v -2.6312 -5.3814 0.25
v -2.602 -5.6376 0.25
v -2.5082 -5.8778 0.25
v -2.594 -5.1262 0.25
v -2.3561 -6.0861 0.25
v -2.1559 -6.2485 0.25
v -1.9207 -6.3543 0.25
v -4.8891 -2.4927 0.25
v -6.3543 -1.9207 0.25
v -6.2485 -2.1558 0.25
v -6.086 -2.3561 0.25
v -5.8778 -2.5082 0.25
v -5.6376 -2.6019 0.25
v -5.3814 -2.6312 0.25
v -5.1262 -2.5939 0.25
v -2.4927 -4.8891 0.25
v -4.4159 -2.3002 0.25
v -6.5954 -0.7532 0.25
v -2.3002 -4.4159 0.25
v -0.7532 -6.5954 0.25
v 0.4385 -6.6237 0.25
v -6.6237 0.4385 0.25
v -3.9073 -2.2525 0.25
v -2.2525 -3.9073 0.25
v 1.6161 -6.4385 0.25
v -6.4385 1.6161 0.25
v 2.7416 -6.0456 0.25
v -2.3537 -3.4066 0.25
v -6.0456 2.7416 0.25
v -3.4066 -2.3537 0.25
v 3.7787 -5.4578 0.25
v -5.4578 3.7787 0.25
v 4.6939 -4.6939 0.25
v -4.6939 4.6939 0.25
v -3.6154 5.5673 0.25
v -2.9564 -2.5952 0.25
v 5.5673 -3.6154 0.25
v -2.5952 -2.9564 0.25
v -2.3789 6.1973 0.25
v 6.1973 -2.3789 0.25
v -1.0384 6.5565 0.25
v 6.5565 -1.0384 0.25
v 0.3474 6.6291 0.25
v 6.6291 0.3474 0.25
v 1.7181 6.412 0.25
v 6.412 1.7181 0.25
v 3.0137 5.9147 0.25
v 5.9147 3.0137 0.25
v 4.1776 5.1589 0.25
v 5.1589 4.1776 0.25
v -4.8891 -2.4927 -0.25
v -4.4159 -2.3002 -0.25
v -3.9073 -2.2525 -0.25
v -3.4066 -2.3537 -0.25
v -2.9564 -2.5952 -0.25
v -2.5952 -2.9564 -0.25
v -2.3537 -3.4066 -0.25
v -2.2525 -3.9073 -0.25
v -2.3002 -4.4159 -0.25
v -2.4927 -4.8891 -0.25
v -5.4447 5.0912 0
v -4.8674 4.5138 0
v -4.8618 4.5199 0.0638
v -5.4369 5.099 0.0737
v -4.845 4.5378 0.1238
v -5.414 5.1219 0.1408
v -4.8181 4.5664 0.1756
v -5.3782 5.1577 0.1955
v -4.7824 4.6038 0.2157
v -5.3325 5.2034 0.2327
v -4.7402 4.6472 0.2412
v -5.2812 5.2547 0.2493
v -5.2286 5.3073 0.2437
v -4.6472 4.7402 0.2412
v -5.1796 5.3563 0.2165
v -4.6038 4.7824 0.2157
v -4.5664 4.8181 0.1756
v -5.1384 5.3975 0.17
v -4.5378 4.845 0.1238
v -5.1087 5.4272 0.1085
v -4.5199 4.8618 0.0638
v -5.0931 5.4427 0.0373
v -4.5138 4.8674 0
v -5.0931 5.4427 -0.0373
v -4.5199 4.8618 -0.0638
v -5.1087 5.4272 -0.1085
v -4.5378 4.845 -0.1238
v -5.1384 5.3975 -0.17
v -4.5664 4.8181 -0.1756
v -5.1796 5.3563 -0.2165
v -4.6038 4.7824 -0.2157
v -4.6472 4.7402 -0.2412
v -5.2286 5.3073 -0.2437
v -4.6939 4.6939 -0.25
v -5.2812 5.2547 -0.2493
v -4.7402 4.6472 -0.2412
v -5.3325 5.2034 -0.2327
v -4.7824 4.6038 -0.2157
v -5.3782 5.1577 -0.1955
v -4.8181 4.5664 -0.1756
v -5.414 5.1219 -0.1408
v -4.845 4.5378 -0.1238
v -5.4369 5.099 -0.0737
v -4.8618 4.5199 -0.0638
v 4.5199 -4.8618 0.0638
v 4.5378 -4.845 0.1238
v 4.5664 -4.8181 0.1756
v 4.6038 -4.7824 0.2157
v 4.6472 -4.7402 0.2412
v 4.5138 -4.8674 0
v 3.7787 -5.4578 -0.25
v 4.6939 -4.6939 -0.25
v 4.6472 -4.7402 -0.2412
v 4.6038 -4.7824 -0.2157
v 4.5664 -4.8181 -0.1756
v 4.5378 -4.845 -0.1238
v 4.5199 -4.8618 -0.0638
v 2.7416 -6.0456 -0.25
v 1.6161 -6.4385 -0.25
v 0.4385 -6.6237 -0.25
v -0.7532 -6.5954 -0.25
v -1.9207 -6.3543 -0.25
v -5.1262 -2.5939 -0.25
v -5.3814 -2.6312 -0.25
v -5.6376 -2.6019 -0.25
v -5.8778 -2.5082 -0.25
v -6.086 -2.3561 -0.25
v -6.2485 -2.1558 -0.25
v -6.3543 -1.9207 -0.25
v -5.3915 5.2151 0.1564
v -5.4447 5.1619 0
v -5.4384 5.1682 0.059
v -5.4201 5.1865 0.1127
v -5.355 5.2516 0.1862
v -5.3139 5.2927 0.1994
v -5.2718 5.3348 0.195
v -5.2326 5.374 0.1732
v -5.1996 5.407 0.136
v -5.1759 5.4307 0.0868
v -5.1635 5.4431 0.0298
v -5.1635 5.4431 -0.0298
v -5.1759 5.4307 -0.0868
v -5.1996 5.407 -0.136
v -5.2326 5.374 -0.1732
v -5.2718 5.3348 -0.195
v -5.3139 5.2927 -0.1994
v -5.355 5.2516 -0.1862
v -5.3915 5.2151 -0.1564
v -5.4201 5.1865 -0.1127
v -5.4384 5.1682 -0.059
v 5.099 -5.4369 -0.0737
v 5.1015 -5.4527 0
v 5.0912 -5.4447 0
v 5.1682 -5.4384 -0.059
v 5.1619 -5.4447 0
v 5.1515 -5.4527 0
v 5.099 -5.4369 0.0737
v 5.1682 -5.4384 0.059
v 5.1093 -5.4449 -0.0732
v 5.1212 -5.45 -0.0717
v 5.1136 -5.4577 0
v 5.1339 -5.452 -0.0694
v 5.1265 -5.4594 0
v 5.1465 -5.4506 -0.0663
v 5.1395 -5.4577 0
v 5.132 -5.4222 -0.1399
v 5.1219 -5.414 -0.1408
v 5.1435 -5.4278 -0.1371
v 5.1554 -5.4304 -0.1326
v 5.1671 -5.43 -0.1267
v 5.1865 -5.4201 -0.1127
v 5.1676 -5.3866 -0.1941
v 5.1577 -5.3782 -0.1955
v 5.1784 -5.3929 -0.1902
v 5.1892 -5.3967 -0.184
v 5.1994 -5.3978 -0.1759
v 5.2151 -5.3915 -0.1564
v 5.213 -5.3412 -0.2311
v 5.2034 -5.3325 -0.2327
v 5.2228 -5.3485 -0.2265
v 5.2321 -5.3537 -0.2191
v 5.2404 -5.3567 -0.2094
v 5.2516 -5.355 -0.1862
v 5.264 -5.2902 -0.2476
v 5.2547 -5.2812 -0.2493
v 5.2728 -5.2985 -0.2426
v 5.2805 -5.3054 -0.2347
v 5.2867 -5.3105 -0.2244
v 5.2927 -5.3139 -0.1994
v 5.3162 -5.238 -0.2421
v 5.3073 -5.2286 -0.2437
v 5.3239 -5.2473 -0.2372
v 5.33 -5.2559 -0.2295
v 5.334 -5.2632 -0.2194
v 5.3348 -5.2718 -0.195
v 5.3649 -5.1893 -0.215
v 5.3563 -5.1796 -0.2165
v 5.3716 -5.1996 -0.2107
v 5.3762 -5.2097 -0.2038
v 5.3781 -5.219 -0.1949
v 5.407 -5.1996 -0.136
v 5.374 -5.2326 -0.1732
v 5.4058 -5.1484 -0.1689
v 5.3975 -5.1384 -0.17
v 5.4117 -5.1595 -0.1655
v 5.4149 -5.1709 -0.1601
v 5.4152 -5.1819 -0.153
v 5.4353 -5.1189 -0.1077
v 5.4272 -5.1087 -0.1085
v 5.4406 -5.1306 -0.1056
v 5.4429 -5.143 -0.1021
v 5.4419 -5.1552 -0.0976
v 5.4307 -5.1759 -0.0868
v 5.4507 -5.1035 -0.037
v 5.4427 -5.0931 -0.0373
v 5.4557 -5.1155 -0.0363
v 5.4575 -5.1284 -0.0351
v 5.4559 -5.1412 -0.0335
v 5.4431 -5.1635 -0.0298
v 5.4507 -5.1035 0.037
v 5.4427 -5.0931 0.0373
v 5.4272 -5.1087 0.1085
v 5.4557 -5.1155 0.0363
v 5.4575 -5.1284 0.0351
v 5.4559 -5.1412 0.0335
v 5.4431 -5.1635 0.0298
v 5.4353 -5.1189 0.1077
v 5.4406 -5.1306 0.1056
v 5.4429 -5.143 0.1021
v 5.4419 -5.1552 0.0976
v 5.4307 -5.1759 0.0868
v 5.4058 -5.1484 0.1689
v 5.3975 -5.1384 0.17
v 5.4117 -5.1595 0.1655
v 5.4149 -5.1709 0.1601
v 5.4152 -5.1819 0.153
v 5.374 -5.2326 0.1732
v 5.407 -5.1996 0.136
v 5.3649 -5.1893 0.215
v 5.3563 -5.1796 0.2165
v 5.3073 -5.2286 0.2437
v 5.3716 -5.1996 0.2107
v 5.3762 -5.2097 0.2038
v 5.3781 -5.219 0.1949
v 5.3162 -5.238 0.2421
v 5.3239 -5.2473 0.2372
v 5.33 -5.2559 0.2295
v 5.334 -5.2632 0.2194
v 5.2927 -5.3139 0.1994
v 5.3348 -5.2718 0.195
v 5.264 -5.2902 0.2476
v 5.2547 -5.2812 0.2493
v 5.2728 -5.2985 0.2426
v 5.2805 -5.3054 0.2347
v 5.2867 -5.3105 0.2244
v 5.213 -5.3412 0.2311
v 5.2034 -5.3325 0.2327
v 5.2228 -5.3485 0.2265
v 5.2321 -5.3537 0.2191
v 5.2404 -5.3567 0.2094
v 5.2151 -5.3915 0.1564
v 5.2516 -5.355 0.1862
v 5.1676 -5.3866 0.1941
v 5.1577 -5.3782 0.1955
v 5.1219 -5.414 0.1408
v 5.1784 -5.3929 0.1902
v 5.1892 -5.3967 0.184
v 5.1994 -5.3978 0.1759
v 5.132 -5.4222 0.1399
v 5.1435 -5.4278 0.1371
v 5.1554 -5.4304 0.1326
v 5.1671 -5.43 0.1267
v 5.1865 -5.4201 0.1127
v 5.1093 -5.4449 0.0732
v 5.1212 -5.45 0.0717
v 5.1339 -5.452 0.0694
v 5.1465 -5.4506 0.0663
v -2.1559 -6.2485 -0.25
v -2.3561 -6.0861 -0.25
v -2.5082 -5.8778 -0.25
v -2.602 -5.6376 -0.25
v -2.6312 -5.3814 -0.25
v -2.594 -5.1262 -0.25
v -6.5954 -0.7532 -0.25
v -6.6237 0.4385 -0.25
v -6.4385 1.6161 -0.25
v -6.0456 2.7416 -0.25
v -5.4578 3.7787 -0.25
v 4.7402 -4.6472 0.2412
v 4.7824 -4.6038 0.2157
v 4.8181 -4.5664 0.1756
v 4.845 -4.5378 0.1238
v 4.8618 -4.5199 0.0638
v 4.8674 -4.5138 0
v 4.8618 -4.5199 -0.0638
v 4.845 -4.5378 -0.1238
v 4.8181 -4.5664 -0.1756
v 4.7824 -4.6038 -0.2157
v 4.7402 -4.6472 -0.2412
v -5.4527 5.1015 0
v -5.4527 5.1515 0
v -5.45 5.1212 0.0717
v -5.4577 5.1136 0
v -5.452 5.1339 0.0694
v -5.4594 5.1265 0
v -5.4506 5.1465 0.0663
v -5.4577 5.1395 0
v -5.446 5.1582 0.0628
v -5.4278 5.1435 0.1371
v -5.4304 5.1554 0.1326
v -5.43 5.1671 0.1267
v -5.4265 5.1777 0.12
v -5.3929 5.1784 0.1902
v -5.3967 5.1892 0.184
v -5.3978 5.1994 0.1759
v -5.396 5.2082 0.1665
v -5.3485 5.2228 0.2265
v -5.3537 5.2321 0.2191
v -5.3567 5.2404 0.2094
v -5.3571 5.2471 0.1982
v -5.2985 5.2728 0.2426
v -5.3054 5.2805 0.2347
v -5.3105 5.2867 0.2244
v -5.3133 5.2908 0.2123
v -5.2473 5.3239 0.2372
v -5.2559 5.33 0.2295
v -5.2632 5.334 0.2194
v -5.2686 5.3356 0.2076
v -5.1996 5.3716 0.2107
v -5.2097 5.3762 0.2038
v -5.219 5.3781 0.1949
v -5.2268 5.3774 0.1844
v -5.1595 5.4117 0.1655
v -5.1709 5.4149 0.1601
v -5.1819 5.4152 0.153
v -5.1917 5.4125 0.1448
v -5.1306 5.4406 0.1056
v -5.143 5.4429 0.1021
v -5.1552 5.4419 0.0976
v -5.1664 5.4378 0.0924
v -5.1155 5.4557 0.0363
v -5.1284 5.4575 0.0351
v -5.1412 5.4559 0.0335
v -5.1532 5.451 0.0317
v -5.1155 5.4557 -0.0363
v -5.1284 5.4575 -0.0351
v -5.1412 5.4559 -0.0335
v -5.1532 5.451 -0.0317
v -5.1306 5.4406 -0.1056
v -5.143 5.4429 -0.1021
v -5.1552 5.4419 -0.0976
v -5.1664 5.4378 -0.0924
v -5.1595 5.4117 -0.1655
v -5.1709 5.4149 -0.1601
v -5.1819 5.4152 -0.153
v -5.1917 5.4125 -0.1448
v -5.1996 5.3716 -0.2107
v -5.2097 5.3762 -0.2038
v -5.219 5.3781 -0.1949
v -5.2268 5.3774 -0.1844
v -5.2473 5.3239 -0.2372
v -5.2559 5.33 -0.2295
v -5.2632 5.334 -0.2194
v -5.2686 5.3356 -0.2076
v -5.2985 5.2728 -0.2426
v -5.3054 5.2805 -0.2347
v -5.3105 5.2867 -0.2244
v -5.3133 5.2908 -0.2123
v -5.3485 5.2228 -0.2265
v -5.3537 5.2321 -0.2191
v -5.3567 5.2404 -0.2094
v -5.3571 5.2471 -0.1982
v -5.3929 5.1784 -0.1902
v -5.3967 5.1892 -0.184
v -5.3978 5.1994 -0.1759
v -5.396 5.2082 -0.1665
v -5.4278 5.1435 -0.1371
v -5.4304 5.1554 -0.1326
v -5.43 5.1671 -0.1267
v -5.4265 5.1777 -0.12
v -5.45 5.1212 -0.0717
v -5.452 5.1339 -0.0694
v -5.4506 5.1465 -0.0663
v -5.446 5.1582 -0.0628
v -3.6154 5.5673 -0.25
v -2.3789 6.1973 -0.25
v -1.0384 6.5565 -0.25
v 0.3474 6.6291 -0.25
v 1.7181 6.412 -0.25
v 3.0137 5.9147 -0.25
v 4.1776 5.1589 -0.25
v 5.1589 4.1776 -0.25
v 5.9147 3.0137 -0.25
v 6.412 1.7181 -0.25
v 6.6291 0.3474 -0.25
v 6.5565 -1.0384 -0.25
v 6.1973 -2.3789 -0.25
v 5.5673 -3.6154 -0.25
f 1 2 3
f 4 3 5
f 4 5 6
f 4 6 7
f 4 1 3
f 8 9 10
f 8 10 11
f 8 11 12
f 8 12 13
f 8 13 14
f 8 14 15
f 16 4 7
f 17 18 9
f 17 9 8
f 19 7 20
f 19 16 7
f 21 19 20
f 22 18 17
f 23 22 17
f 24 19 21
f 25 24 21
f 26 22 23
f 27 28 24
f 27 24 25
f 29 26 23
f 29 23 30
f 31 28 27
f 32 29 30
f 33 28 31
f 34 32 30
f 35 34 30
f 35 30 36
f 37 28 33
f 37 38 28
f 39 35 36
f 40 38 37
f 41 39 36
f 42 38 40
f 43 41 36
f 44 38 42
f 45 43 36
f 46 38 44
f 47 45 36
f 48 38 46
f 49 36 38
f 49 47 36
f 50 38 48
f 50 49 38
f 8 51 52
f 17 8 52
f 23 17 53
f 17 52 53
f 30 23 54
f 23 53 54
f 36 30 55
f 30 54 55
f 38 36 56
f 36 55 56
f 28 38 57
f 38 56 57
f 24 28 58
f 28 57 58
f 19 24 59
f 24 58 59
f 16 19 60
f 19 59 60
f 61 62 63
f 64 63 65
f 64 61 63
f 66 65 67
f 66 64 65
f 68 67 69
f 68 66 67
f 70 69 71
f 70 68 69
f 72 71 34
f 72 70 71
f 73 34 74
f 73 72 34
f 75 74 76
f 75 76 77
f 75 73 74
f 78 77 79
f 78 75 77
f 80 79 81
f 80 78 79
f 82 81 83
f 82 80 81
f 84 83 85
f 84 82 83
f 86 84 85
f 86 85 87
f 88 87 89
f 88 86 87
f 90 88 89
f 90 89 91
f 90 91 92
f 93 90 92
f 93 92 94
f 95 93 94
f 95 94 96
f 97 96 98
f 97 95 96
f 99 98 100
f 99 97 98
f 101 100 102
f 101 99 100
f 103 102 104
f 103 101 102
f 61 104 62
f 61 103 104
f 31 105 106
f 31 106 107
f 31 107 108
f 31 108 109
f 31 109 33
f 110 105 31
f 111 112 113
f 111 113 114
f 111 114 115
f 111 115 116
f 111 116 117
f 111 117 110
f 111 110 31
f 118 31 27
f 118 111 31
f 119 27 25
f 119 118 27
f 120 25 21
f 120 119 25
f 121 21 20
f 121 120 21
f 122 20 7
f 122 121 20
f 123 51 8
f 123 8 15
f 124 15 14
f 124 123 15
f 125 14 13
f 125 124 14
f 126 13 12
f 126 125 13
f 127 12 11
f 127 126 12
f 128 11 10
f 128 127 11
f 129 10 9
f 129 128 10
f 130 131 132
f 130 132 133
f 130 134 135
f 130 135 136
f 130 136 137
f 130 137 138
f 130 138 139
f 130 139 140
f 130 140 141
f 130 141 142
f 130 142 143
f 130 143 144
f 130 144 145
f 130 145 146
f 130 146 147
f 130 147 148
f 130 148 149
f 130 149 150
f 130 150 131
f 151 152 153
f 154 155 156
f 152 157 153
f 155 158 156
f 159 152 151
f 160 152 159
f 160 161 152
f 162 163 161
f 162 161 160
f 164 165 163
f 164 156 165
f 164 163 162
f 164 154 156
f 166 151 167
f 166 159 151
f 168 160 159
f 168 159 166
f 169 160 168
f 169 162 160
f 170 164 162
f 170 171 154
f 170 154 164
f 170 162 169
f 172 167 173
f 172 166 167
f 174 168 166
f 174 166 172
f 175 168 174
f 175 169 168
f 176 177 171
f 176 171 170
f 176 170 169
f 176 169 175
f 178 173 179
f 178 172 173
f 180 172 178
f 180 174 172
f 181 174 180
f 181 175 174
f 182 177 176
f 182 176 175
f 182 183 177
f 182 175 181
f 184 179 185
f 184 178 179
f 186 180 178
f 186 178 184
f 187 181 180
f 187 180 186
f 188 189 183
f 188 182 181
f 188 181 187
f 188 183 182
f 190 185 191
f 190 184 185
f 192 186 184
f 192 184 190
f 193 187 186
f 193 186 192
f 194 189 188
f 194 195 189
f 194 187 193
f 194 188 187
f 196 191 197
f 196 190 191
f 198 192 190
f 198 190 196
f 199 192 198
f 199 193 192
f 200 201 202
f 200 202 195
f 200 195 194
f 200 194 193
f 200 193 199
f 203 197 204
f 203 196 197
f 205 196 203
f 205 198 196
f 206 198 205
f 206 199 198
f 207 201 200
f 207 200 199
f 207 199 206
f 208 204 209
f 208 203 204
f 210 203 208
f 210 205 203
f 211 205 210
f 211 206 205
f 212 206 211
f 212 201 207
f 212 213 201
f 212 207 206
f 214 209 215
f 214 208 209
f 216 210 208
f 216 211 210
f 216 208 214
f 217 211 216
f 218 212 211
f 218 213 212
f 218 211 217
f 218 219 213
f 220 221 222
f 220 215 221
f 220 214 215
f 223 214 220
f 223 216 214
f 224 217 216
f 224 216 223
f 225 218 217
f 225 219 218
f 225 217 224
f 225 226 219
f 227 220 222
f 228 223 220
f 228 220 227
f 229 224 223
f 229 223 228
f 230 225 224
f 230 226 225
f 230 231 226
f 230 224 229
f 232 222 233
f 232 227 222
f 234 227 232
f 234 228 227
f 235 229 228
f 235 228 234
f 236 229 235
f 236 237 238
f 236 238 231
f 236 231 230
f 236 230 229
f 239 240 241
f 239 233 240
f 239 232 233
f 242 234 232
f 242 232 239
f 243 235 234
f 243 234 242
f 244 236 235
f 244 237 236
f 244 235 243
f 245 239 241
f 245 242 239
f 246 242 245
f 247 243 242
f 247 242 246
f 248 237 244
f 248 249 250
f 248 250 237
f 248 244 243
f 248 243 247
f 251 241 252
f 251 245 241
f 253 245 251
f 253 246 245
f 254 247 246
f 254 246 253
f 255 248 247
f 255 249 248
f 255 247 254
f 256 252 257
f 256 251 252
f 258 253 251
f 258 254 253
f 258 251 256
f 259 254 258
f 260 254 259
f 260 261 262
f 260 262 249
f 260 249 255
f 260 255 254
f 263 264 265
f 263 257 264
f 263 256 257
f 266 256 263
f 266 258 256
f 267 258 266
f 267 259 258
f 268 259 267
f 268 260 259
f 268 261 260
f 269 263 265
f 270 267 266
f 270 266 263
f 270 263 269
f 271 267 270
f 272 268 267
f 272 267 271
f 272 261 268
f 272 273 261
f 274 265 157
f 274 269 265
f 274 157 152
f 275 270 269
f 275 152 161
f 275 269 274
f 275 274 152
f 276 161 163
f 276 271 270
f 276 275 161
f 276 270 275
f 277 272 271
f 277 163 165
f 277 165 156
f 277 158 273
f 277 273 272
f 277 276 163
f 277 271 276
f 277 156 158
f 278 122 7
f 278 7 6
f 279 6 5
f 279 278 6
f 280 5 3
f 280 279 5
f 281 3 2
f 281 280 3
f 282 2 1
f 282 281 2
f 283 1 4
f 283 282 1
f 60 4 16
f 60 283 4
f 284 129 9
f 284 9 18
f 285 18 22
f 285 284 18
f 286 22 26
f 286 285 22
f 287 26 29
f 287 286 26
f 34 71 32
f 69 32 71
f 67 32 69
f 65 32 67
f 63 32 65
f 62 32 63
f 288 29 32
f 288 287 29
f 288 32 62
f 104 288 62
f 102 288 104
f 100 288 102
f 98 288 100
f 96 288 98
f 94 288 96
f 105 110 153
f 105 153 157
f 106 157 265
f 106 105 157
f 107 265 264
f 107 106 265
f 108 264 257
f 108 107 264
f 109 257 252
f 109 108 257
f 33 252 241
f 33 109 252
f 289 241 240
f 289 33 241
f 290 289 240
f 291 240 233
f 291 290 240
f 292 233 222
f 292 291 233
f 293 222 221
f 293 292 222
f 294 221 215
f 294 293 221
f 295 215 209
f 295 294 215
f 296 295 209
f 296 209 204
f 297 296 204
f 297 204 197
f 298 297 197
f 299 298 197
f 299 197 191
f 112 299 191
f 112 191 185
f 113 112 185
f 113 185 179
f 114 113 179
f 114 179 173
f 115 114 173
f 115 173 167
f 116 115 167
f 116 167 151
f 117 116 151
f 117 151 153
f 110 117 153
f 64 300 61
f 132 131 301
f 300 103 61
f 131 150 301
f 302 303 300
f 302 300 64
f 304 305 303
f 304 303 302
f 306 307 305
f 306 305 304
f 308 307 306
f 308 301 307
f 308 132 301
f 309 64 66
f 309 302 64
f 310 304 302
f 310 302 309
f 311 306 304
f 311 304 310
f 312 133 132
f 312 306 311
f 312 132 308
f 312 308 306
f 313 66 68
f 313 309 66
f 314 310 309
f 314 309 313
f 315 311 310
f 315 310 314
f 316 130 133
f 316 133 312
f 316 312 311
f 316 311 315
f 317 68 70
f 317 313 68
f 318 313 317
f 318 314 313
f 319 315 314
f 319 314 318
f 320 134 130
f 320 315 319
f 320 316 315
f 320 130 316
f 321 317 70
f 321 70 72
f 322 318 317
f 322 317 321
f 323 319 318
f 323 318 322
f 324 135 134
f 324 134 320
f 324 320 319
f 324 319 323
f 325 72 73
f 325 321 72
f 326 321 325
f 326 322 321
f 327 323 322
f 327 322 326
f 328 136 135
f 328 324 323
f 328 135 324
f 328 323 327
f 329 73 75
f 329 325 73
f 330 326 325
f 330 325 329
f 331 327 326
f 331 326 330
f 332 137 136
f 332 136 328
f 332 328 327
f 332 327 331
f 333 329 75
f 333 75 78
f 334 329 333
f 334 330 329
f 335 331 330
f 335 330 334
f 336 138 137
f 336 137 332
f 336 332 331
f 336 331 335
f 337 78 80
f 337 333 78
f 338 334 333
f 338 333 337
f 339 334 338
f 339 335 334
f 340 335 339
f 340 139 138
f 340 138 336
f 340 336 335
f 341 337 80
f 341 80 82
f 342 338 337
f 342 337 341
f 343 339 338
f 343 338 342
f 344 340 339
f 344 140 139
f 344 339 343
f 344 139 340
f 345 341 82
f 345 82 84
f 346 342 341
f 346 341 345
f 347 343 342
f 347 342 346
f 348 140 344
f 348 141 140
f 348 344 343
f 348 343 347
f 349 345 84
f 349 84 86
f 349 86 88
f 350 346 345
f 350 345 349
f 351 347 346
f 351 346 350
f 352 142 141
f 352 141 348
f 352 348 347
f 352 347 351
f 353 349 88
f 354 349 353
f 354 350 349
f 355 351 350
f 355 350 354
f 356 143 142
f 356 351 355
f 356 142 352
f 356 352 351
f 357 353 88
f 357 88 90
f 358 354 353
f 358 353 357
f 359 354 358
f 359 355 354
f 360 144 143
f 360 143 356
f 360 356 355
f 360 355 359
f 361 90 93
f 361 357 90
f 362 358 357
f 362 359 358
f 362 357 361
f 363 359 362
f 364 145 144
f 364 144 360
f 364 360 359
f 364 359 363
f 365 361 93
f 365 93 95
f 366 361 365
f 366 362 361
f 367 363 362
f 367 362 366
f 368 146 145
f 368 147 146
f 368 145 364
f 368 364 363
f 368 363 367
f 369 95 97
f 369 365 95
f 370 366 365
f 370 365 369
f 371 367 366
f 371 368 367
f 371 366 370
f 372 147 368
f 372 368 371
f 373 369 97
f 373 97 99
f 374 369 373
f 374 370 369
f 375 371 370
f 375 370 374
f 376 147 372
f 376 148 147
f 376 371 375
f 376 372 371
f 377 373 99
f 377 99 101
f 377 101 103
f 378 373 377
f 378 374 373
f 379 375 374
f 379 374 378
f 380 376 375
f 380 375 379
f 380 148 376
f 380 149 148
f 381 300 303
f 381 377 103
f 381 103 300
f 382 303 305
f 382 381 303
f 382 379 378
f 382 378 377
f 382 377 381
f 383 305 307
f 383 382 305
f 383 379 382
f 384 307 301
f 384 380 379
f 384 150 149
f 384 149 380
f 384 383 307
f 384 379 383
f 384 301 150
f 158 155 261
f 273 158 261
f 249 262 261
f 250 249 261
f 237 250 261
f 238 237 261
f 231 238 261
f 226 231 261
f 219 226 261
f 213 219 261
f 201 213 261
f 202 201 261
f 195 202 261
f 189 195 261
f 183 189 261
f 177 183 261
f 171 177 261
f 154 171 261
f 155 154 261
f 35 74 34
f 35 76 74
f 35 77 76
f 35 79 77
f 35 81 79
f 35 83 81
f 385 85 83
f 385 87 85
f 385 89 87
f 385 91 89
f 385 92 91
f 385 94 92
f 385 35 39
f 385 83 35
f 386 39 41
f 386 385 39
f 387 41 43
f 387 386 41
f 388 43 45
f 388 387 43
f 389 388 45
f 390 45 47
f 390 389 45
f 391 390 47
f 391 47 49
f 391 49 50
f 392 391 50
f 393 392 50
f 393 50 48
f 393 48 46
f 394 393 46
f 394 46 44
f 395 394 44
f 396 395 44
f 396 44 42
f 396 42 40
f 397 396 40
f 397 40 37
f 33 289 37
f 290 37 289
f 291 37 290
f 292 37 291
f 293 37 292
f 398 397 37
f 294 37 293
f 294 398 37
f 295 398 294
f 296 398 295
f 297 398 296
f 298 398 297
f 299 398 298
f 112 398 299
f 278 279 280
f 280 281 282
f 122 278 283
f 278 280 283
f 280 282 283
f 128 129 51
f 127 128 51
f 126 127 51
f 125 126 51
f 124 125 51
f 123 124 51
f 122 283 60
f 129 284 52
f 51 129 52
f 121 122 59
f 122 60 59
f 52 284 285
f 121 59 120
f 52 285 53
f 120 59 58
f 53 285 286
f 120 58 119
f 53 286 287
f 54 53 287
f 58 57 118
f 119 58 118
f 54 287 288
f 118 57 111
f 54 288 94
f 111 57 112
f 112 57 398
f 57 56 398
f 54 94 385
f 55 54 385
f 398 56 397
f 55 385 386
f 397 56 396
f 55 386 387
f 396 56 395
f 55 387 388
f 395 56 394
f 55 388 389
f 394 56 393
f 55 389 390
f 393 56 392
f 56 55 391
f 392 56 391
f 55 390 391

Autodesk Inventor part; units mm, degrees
ref_plane "YZ Plane" through (0, 0, 0) normal (1, 0, 0) x (0, 1, 0)
ref_plane "XZ Plane" through (0, 0, 0) normal (0, 1, 0) x (-1, 0, 0)
sketch "Sketch1" plane through (0, 0, 0) normal (0, 0, 1) x (1, 0, 0)
  circle A0 centre (-4, -4) radius 0.9814 construction
  circle A1 centre (4, 4) radius 0.9814 construction
  line L0 (-7, -7) -> (7, -7) construction
  line L1 (-7, 7) -> (-7, -7) construction
  line L2 (7, 7) -> (-7, 7) construction
  line L3 (7, -7) -> (7, 7) construction
  line L4 (0, -7) -> (0, 7)
  line L5 (-7, 0) -> (7, 0)
  arc A2 (-1.9207, -6.3543) -> (-6.3543, -1.9207) centre (0, 0) ccw
  arc A3 (-2.4927, -4.8891) -> (-4.8891, -2.4927) centre (-4, -4) ccw
  arc A4 (-2.4927, -4.8891) -> (-1.9207, -6.3543) centre (-1.6313, -5.3971) ccw
  arc A5 (-6.3543, -1.9207) -> (-4.8891, -2.4927) centre (-5.3971, -1.6313) ccw
  point P0 (0, 0)
  dimension "d0" = 3
  dimension "d1" = 3
  dimension "d2" = 3
  dimension "d3" = 3
  dimension "d4" = 3.5
  dimension "d5" = 1
extrude "Extrusion1" add sketch "Sketch1" along normal mid plane 0.5
sketch "Sketch4" plane through (0, 0, 0) normal (0, 0, 1) x (1, 0, 0)
  line L0 (5.3033, -5.3033) -> (-5.3033, 5.3033)
  line L1 (0, 0) -> (0, 0.8225) construction
  dimension "d9" = 45
  dimension "d11" = 7.5
  dimension "d12" = 7.5
ref_plane "Work Plane1" through (5.3033, -5.3033, 0) normal (-0.7071068, 0.7071068, 0) x (-0.7071068, -0.7071068, 0)
sketch "Sketch5" plane through (5.3033, -5.3033, 0) normal (-0.7071068, 0.7071068, 0) x (-0.7071068, -0.7071068, 0)
  circle A0 centre (0, 0) radius 0.25
  point P0 (0, 0)
  dimension "d10" = 0.5
sweep "Sweep1" add profiles "Sketch5" path "Sketch4"
fillet "Fillet1" radius 0.05 2 edges at (5.4801, -5.1265, 0) (-5.1265, 5.4801, 0)
properties part number "coin" material "ABS Plastic"
